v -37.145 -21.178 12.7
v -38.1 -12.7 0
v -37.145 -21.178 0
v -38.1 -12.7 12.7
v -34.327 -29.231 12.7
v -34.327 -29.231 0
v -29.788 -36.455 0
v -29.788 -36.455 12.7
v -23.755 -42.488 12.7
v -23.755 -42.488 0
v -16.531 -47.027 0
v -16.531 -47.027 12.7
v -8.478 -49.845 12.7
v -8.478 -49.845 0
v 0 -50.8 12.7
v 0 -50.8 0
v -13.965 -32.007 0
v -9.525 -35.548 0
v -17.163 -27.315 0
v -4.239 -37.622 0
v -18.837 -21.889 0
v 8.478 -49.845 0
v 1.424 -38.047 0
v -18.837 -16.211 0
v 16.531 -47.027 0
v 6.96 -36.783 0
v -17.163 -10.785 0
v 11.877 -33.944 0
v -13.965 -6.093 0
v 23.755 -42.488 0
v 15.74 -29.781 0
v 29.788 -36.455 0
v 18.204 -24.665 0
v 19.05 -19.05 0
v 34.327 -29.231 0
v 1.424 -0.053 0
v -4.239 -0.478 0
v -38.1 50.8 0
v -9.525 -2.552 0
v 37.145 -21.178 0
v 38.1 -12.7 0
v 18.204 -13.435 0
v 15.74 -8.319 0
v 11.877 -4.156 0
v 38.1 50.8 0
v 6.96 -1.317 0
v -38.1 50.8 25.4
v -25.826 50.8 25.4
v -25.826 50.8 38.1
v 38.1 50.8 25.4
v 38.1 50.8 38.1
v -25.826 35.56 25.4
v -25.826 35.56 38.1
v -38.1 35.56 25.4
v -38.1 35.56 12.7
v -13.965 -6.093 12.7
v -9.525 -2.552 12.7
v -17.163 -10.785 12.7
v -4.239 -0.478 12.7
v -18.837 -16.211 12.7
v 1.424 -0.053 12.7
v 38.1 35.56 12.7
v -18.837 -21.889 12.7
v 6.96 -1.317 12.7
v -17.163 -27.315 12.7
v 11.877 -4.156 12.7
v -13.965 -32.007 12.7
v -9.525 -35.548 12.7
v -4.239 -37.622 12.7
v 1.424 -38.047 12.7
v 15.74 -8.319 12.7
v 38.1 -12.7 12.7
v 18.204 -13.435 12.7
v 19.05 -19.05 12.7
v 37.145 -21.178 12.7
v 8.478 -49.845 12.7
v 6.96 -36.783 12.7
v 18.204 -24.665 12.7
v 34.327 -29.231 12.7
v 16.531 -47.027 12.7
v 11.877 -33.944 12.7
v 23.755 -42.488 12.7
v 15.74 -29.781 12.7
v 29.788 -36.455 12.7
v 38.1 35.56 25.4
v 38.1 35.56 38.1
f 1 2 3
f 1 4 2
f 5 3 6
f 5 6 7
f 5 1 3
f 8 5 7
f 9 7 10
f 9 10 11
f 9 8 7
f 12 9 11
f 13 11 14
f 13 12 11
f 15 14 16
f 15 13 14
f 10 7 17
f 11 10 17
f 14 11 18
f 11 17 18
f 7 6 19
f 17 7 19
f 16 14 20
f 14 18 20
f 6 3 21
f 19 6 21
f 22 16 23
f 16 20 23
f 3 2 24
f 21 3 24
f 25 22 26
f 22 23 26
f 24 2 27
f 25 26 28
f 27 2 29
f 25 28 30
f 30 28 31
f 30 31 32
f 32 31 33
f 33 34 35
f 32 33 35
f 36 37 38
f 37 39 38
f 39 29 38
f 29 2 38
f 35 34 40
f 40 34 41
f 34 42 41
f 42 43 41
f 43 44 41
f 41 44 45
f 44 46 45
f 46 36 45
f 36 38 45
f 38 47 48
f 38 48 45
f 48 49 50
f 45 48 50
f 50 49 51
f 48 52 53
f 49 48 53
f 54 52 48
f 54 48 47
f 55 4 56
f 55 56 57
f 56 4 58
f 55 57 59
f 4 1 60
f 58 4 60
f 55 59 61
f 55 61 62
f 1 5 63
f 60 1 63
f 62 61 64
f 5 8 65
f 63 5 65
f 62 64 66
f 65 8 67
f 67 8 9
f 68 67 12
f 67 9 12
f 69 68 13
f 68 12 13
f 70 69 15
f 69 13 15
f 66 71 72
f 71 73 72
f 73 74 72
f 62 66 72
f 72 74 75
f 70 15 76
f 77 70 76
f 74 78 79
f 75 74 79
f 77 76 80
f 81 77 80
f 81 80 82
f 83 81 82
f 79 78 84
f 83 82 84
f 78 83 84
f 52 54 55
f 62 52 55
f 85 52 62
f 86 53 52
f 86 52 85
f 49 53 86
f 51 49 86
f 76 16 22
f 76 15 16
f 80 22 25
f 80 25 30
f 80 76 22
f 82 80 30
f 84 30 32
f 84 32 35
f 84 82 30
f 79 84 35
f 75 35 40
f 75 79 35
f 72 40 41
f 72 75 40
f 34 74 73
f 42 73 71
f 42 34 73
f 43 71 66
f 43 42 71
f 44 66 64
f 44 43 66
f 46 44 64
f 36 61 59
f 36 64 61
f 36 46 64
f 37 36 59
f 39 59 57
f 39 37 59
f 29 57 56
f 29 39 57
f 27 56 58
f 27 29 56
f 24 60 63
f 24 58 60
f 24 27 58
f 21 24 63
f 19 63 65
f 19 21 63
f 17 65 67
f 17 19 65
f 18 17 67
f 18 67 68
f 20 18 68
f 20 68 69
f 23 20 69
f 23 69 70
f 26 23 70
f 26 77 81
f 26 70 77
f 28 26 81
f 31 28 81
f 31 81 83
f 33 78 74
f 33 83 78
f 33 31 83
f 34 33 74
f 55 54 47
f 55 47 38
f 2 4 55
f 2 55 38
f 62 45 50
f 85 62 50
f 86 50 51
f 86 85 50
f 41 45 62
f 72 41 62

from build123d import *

# Parameters (mm, degrees)
F0_W     = 76.2
F0_H     = 101.6
F1_DEPTH = 12.7
F2_W     = 63.9262623101
F2_H     = 12.7
F3_DEPTH = 50.8
F4_DEPTH = 35.56
F5_R     = 19.05
F6_DEPTH = 38.101
F7_R     = 38.09999


# Not quite as in the source:
# - a fillet or chamfer is up to 0.001 mm smaller than in the source, because OpenCascade refuses the exact size


with BuildPart() as f1:
    # F0 (on Top) → F1 (new body)
    with BuildSketch(Plane.XY):
        Rectangle(F0_W, F0_H)
    extrude(amount=F1_DEPTH)

    # F2 (on Front) → F3 (join)
    with BuildSketch(Plane.XZ):
        Polygon((-25.8262623101, 25.4), (-38.1, 25.4), (-38.1, 12.7), (38.1, 12.7), (38.1, 25.4), align=None)
        with Locations((6.1368688449, 31.75)):
            Rectangle(F2_W, F2_H)
    extrude(amount=-F3_DEPTH)

    # F4 (cut): a face of the model
    f4_faces = [f1.faces().sort_by_distance(p)[0] for p in [
        (2.7996685352, 0, 24.8437999484),
    ]]
    extrude(f4_faces, amount=-F4_DEPTH, mode=Mode.SUBTRACT)

    # F5 (on Top) → F6 (cut, through all)
    with BuildSketch(Plane.XY):
        with Locations((0, -19.05)):
            Circle(F5_R)
    extrude(amount=F6_DEPTH, mode=Mode.SUBTRACT)

    # F7 (radius 38.1 in the source; OpenCascade refuses exactly that, so slightly less here)
    f7_edges = [f1.edges().sort_by_distance(p)[0] for p in [
        (-38.1, -50.8, 6.35),
        (38.1, -50.8, 6.35),
    ]]
    fillet(f7_edges, radius=F7_R)


solid = f1.part
